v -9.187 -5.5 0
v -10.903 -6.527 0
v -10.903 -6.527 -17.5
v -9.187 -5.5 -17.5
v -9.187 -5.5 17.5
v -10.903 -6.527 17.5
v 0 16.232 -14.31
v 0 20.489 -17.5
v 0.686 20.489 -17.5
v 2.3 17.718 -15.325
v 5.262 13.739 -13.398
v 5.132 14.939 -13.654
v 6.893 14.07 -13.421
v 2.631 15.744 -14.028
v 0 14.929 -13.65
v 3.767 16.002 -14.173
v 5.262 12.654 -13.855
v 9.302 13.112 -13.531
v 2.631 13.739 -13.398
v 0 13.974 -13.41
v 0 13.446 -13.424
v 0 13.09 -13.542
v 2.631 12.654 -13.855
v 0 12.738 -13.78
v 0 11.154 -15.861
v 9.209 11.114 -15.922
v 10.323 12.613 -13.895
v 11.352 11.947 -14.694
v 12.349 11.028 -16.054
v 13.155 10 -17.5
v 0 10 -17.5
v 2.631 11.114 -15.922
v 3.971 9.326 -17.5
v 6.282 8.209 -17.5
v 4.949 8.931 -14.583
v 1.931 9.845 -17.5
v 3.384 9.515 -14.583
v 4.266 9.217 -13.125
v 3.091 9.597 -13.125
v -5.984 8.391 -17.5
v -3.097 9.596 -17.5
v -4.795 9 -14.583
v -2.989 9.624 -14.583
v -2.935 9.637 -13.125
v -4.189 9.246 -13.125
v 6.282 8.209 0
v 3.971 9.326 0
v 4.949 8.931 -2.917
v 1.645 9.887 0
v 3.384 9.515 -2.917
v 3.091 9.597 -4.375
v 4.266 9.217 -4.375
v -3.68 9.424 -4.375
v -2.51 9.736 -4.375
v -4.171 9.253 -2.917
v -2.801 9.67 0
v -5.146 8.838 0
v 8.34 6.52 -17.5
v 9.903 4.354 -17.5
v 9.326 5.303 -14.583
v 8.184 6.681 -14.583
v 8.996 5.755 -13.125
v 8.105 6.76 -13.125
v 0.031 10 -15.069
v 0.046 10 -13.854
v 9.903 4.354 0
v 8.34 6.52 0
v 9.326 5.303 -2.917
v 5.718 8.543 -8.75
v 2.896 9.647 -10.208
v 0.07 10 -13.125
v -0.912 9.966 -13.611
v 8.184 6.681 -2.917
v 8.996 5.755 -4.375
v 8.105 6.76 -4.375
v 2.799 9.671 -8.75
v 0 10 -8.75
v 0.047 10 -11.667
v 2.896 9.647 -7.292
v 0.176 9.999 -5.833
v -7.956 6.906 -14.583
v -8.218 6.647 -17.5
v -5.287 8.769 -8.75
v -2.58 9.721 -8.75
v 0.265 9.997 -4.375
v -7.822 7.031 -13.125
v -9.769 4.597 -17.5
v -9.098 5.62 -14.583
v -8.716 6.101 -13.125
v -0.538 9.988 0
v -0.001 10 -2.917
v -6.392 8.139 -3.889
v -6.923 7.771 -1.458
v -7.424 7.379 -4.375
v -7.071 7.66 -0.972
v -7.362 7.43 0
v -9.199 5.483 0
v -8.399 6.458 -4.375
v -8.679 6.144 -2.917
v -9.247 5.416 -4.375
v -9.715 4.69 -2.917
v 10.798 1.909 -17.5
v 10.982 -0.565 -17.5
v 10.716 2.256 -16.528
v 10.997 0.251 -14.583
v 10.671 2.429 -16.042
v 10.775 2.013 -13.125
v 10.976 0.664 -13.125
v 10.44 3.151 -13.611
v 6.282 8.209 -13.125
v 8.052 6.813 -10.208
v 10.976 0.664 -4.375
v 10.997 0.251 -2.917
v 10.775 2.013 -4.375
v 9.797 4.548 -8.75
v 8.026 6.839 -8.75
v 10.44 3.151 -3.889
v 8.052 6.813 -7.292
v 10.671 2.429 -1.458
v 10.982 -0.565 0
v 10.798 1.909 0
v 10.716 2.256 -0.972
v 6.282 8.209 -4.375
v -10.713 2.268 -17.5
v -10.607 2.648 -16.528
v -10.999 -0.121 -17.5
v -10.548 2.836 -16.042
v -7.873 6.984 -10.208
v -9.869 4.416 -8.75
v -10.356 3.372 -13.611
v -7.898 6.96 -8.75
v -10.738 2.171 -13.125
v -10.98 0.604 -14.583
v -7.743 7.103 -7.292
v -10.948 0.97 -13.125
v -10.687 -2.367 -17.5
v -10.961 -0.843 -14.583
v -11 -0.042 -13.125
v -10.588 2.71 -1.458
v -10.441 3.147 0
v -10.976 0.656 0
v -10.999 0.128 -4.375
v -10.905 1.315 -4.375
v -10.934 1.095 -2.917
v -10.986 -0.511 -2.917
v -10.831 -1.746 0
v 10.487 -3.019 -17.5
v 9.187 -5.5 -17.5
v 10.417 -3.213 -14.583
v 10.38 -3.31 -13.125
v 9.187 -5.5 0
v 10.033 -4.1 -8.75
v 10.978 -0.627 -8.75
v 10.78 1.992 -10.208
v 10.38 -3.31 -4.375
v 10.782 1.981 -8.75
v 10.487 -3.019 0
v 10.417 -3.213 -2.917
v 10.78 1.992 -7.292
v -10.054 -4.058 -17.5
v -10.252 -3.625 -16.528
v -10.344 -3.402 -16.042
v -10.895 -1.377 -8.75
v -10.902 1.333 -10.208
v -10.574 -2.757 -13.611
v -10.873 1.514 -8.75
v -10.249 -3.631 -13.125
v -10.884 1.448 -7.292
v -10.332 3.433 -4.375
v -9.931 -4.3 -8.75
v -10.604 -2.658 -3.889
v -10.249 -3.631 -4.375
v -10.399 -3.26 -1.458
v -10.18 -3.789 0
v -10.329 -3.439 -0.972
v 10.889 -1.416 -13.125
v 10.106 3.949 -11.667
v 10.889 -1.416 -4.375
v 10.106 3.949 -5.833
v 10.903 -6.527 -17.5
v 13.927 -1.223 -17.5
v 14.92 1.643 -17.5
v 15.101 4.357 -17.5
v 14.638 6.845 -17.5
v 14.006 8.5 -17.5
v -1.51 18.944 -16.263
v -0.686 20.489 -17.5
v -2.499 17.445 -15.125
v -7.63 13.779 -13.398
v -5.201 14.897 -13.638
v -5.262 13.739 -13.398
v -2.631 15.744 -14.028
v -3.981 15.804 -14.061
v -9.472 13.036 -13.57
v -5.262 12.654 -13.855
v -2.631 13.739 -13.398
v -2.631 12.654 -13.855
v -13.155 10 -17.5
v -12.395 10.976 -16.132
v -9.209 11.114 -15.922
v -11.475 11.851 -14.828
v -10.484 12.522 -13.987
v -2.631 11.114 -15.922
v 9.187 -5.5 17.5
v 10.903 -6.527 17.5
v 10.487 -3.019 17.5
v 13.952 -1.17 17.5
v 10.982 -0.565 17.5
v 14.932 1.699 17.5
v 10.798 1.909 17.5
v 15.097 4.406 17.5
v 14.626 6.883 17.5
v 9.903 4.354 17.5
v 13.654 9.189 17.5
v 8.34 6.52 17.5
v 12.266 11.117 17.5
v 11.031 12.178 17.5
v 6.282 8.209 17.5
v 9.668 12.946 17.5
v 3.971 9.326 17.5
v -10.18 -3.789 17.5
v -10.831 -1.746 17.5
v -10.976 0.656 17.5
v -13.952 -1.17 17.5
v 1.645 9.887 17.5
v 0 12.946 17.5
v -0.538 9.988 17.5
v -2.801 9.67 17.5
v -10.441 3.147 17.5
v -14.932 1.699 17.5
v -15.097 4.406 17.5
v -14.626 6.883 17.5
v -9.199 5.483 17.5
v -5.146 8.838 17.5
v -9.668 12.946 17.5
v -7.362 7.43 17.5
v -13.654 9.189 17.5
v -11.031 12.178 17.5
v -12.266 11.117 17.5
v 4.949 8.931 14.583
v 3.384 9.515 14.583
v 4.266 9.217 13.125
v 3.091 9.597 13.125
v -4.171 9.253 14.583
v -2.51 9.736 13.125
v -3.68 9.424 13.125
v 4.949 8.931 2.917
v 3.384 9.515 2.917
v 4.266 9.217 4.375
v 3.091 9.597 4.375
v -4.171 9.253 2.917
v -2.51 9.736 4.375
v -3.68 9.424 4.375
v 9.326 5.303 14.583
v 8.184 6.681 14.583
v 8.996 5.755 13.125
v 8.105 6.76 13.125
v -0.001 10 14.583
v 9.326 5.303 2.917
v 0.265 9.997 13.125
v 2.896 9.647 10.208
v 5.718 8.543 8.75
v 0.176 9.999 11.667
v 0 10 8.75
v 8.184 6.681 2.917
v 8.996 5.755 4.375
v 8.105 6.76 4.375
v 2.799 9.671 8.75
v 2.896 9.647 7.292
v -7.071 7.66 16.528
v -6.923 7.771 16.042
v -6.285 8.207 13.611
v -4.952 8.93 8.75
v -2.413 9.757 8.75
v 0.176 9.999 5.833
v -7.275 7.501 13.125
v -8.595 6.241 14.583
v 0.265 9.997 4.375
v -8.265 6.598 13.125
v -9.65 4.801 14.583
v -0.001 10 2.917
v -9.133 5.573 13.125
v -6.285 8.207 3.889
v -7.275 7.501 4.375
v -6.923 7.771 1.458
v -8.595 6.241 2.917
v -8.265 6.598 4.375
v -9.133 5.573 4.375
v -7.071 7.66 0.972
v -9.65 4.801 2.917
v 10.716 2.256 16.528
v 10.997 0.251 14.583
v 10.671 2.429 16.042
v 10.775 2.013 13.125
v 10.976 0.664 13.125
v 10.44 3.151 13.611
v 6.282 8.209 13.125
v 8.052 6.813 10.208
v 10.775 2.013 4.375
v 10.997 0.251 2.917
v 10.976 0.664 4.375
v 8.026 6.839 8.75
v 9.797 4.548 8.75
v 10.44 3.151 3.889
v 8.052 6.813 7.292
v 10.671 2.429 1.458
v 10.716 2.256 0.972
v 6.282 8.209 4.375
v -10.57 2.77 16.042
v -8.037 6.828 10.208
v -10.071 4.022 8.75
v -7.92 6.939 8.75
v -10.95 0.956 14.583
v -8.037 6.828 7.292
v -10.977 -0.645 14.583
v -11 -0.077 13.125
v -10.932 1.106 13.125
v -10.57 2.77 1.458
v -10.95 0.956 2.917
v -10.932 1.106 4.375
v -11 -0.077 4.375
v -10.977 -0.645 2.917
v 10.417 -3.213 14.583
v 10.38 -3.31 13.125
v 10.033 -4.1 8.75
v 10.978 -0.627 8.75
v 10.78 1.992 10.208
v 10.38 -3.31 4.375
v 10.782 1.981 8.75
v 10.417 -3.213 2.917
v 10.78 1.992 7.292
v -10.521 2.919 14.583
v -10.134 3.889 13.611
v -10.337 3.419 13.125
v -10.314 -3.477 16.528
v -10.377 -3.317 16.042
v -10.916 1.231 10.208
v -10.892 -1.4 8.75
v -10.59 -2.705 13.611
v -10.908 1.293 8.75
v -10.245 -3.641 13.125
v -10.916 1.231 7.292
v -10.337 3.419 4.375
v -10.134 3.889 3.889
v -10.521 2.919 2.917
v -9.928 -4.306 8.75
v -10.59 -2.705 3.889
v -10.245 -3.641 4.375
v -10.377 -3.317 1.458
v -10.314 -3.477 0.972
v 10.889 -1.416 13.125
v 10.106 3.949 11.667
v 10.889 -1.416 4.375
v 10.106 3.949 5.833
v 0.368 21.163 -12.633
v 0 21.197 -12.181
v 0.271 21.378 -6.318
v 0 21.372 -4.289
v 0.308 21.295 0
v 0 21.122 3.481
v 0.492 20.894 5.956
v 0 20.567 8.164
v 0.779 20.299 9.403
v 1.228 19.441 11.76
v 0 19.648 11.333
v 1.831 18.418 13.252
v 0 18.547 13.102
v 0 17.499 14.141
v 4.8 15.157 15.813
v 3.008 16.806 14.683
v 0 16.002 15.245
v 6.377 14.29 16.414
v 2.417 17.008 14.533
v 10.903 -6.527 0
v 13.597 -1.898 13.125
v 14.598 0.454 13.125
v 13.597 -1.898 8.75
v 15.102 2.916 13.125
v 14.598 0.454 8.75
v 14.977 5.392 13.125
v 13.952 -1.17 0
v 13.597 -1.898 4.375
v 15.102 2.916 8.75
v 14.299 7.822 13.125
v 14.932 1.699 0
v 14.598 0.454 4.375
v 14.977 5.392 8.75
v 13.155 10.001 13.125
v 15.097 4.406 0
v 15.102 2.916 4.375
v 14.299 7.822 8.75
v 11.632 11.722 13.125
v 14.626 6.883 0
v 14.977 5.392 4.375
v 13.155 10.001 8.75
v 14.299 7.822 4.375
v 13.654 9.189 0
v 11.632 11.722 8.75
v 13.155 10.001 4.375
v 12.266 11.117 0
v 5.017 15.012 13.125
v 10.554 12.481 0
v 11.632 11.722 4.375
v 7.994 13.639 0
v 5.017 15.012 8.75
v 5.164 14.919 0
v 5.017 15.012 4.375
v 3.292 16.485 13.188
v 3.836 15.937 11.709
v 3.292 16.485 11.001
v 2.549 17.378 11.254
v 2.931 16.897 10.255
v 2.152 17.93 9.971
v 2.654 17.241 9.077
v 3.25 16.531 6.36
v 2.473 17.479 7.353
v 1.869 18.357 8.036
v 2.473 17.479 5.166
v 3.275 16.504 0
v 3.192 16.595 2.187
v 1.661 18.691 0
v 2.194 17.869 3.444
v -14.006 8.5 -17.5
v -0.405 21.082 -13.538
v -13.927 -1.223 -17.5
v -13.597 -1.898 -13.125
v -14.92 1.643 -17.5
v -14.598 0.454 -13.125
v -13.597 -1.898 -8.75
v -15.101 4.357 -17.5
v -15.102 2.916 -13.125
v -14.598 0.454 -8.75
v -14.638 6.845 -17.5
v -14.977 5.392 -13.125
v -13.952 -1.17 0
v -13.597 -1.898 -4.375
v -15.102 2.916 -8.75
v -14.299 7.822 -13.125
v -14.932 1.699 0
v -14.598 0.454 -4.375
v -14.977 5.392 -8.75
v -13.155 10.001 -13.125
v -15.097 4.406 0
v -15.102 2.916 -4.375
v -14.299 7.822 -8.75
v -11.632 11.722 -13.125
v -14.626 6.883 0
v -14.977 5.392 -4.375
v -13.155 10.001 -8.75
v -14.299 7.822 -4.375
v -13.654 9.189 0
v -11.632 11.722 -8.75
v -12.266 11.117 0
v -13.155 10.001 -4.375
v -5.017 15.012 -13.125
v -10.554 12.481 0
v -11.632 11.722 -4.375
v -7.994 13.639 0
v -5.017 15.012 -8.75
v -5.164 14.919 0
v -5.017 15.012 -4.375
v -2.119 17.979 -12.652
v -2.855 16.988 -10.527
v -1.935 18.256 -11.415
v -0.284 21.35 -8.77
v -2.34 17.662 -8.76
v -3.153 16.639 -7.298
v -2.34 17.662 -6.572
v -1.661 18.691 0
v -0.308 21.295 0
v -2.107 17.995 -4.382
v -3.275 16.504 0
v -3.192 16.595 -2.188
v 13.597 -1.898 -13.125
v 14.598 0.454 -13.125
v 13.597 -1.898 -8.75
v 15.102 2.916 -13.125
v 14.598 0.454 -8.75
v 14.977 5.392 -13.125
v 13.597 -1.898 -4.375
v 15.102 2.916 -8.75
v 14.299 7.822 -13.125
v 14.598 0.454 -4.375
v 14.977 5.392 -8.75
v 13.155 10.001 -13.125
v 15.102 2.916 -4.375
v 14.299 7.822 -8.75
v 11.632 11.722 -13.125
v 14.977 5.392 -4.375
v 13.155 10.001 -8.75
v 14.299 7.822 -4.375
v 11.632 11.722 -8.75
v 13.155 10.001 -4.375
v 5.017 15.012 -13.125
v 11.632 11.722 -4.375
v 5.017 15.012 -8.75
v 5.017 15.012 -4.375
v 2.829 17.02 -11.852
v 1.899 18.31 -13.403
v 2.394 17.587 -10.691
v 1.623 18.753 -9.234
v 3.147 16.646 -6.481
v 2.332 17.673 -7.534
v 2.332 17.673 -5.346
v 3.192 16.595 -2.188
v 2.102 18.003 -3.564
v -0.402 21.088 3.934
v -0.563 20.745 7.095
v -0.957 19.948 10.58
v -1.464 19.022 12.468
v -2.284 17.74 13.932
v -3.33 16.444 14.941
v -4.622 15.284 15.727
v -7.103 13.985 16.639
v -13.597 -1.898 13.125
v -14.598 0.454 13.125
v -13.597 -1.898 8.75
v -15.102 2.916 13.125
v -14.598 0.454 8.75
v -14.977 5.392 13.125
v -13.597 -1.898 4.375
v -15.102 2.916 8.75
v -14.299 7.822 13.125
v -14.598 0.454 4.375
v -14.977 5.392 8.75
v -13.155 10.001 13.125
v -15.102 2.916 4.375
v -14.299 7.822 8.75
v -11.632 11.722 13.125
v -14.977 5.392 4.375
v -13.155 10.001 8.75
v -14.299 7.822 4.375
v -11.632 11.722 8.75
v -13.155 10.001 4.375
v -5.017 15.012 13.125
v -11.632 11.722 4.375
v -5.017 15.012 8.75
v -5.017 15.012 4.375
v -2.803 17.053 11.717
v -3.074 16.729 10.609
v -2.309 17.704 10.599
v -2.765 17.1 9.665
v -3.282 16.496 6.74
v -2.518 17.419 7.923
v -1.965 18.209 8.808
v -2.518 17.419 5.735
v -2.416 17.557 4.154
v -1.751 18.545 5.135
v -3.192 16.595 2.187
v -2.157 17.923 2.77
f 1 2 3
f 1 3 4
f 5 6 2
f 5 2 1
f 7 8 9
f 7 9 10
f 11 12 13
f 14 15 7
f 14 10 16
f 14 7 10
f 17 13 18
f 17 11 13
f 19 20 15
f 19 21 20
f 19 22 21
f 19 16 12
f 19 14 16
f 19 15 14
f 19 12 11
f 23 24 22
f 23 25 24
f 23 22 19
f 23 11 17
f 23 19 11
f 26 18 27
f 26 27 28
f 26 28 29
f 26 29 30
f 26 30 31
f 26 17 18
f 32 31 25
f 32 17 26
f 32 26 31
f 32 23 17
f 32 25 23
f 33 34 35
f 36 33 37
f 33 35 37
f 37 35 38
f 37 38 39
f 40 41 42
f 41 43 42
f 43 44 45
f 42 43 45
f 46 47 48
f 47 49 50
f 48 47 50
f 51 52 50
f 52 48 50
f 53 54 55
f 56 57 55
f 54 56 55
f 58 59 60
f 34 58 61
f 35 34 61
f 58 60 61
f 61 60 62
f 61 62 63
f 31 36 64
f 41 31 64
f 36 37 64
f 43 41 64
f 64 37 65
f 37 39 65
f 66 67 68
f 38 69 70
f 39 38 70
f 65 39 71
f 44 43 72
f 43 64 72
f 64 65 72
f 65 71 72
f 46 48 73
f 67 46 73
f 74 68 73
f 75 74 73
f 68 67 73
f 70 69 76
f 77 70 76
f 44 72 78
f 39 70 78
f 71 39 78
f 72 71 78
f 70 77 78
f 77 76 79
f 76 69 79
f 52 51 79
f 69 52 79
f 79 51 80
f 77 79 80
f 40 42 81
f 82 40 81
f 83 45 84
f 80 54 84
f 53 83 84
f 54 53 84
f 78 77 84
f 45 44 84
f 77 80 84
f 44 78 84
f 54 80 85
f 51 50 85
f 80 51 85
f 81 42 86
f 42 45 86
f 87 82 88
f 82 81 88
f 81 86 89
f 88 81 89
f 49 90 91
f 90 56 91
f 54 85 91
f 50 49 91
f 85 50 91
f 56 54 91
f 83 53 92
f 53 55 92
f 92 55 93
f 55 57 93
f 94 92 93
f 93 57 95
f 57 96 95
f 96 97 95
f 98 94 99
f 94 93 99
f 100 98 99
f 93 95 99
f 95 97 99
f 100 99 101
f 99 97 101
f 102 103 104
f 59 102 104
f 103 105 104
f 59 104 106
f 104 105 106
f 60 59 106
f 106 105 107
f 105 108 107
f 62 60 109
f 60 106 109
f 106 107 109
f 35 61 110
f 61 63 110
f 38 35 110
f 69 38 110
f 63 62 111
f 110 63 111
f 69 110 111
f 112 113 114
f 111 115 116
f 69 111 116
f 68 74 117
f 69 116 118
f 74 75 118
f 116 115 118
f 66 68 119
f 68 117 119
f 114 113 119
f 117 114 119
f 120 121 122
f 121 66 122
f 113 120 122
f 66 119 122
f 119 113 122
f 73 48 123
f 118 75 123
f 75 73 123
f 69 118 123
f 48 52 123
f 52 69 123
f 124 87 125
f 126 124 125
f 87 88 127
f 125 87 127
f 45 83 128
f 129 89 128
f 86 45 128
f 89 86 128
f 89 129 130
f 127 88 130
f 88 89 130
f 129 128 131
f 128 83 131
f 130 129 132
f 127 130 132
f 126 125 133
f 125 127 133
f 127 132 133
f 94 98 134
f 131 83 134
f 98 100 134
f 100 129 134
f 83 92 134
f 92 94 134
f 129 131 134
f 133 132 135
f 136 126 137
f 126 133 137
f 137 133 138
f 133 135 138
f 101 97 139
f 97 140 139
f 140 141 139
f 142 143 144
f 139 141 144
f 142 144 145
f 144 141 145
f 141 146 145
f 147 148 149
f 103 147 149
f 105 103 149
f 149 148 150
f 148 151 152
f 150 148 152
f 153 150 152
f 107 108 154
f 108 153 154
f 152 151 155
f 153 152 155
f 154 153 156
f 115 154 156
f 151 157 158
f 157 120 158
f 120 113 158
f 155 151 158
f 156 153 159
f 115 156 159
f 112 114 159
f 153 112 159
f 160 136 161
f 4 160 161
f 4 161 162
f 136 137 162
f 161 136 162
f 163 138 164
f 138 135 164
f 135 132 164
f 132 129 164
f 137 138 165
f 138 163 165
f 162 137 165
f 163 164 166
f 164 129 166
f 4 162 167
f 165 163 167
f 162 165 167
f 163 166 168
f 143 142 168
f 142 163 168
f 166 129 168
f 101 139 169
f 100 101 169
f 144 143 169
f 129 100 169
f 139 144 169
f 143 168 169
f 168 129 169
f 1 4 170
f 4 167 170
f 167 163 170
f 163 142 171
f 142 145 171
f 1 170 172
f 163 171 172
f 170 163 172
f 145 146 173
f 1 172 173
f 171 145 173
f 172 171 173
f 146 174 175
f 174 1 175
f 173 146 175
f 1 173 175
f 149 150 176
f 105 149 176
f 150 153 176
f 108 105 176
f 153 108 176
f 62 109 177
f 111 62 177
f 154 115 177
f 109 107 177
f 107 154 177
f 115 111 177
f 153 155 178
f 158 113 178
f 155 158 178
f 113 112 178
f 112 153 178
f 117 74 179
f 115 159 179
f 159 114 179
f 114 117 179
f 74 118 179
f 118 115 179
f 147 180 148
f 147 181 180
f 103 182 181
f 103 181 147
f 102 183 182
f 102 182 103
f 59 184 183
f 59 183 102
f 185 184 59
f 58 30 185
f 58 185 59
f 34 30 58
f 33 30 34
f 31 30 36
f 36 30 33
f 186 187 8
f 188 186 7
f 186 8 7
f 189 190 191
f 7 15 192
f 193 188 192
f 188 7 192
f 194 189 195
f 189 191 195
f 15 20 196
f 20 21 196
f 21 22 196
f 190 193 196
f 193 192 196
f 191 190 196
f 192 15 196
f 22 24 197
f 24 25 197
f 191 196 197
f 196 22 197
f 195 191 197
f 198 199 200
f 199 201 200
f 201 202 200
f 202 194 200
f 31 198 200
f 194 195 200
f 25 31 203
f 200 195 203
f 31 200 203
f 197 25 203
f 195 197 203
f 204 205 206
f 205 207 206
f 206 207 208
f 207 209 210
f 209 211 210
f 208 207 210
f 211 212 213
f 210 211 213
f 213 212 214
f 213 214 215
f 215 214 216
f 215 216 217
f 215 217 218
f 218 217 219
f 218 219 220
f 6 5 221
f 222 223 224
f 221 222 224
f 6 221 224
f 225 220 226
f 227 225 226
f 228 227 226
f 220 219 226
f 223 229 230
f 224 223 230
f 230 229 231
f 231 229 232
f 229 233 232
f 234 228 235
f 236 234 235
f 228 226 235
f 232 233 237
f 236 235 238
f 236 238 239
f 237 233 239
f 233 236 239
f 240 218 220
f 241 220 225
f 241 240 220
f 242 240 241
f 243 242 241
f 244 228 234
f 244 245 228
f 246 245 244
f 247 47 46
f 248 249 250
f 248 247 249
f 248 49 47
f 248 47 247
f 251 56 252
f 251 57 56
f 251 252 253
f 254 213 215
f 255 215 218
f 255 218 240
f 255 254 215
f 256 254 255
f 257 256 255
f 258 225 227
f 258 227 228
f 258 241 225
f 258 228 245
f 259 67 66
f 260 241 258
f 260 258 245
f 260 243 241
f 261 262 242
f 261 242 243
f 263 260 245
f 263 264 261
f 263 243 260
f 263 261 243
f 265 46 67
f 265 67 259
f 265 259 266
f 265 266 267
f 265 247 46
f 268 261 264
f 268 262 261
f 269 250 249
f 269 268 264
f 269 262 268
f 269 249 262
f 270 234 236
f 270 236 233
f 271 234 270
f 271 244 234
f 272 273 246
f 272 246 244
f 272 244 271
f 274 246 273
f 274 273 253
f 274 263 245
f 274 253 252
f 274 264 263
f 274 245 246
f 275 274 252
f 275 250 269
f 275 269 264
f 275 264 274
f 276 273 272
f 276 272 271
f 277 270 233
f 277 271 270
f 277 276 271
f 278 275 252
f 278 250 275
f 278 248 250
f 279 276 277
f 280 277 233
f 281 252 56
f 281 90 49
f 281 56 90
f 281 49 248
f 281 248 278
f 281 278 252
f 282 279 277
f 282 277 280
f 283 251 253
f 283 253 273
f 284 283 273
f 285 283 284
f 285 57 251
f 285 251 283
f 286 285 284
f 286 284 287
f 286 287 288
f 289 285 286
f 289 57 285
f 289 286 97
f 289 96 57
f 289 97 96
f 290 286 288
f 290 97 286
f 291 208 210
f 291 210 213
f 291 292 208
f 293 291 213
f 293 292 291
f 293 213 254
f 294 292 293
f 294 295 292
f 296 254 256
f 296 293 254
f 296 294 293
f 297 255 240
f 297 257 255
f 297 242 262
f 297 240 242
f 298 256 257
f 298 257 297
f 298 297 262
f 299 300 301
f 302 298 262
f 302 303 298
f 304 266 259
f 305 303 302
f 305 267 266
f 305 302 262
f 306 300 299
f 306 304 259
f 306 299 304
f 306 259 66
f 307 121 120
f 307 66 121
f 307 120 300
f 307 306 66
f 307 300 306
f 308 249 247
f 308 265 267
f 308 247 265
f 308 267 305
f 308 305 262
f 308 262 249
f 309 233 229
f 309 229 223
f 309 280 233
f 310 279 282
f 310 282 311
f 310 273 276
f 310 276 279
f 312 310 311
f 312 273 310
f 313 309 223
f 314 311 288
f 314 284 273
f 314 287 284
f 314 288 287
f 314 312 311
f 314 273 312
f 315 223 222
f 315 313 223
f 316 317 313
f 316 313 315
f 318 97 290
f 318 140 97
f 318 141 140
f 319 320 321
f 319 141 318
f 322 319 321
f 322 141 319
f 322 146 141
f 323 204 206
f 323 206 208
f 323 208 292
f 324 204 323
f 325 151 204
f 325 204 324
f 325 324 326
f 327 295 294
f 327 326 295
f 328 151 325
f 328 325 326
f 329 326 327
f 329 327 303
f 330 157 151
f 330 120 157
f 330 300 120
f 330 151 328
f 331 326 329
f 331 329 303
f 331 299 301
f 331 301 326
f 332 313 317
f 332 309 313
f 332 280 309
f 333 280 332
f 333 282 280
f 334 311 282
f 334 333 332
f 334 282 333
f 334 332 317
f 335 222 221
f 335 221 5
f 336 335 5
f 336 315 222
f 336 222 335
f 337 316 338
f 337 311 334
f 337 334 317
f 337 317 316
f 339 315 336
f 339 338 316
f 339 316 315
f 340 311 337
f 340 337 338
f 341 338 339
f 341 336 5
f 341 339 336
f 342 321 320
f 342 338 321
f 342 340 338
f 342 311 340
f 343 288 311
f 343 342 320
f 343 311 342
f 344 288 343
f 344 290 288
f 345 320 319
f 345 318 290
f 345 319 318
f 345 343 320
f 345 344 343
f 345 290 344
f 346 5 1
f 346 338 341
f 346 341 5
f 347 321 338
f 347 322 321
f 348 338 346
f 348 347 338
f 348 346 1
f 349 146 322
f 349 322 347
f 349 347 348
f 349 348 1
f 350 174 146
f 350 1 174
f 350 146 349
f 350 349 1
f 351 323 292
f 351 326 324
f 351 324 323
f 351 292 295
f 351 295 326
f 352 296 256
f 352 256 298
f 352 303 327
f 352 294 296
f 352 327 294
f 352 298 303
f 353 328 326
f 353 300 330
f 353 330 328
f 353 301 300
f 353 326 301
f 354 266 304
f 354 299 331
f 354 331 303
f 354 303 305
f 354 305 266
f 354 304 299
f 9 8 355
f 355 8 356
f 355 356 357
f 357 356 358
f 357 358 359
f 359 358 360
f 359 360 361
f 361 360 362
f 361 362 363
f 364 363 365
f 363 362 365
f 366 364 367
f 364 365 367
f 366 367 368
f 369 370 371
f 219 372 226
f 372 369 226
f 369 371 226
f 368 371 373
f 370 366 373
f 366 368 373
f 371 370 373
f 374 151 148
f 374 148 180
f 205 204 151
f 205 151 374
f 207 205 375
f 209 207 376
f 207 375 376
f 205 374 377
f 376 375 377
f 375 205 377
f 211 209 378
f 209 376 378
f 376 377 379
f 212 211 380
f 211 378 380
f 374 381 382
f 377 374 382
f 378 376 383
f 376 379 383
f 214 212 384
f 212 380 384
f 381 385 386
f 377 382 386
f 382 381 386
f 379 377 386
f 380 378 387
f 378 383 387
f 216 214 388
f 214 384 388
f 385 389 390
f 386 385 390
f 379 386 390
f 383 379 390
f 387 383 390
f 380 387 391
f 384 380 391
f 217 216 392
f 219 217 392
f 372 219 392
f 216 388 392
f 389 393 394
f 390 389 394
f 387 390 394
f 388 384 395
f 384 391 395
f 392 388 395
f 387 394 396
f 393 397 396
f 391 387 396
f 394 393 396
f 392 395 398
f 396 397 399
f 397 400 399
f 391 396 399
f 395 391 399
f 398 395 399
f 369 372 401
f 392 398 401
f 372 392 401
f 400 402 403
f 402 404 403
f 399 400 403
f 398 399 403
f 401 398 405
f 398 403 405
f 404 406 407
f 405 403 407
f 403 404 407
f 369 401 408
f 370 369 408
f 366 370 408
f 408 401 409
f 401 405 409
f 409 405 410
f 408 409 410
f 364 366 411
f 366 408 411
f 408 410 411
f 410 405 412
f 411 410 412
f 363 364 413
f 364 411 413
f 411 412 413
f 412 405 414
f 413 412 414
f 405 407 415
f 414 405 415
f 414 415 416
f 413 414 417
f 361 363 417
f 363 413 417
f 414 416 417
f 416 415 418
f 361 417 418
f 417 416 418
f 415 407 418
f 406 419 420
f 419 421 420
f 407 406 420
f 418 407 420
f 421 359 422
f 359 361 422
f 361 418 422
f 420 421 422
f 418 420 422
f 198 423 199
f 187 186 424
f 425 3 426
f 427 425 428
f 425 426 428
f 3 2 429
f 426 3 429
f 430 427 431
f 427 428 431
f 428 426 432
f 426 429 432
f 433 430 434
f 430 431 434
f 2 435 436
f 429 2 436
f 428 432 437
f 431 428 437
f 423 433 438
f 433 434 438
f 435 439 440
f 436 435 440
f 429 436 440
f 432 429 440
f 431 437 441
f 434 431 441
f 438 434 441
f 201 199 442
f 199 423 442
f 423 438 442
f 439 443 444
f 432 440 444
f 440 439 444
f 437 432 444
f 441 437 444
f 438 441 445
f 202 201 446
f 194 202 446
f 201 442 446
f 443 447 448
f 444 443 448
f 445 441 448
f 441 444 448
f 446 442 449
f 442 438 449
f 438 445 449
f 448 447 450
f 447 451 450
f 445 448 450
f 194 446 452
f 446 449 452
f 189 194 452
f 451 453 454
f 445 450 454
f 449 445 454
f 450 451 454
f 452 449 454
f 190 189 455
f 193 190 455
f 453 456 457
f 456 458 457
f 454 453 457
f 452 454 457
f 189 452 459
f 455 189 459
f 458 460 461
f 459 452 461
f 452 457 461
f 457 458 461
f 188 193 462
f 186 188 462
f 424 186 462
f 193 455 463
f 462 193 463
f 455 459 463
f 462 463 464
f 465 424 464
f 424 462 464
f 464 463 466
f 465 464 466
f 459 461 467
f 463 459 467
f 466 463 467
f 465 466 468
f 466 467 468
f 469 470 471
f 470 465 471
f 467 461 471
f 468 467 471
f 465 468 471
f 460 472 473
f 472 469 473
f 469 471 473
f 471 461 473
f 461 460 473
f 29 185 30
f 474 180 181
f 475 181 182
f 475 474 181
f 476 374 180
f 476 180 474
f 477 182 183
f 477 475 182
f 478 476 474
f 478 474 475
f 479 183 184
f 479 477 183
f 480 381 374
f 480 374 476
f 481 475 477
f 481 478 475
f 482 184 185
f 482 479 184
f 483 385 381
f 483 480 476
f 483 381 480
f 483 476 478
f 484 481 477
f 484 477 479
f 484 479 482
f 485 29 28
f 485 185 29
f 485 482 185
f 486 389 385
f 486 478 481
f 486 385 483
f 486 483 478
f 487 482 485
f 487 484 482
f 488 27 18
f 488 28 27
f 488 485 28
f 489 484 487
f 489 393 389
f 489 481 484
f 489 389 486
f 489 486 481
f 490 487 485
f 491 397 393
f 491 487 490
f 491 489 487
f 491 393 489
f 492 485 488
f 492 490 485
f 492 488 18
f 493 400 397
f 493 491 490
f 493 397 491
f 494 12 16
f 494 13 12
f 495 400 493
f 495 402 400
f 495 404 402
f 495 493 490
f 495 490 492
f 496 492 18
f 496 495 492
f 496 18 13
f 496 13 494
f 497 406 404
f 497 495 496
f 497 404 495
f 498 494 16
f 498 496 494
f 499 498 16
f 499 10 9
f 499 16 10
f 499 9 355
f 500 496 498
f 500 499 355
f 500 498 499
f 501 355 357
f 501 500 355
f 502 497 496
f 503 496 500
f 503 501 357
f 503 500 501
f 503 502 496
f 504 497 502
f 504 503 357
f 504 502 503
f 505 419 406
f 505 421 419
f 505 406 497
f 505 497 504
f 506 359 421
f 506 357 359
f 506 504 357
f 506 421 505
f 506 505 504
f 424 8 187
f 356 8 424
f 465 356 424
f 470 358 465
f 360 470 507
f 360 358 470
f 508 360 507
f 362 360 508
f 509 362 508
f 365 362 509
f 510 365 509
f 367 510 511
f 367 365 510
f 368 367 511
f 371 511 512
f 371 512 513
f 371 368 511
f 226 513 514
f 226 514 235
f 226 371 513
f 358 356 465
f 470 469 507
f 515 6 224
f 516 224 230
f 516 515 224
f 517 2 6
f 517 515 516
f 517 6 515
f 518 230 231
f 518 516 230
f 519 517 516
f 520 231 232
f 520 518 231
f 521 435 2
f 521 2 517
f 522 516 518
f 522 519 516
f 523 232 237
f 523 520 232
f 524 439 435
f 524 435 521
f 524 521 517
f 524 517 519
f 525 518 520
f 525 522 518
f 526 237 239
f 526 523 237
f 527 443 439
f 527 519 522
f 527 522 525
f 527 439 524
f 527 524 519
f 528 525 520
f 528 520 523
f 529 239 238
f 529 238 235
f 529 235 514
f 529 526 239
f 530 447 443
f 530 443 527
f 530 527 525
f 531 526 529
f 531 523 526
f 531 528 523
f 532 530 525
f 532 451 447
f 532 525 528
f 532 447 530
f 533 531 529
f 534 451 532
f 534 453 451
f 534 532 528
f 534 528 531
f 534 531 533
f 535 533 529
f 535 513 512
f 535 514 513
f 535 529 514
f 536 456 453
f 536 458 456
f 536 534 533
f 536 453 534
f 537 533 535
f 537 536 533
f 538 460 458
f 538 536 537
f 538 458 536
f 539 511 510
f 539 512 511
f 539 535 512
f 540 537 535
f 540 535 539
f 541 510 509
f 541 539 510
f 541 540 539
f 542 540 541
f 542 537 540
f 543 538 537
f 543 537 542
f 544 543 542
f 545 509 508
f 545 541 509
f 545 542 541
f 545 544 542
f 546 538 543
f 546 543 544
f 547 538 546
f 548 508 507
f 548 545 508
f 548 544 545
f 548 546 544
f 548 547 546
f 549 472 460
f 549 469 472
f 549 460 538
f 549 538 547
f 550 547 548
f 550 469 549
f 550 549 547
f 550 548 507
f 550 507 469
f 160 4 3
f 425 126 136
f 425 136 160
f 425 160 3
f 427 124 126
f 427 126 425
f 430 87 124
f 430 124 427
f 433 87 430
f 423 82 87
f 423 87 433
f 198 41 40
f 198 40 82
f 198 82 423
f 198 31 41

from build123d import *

# Parameters (mm, degrees)
F1_DEPTH      = 17.5
F3_DEPTH      = 15.1287347934
F3_DEPTH_BACK = 15.1287347934
F5_DEPTH      = 15.1287347934
F5_DEPTH_BACK = 15.1287347934


with BuildPart() as f1:
    # F0 (on Top) → F1 (new body, symmetric)
    with BuildSketch(Plane.XY):
        with BuildLine():
            add(Edge.make_bspline(
                [(9.1868111987, -5.5), (20.415135997, 10), (0, 10), (-20.415135997, 10), (-9.1868111987, -5.5)],
                knots=[2.5592284157, 2.5592284157, 2.5592284157, 4.7123889804, 4.7123889804, 6.865549545, 6.865549545, 6.865549545], degree=2, weights=[1, 0.474341649, 1, 0.474341649, 1]))
            Line((9.1868111987, -5.5), (10.9027922676, -6.5273309939))
            add(Edge.make_bspline(
                [(10.9027922676, -6.5273309939), (12.7389340253, -3.3890525439), (16.8731179435, 2.3245435176), (12.5821699396, 13.0625810745), (4.2594516513, 14.0193672421), (1.2600043773, 19.0299124435), (0, 22)],
                knots=[0, 0, 0, 0, 0.2691946522, 0.5268109314, 0.7543956387, 1, 1, 1, 1], degree=3))
            add(Edge.make_bspline(
                [(-10.9027922676, -6.5273309939), (-12.7389340253, -3.3890525439), (-16.8731179435, 2.3245435176), (-12.5821699396, 13.0625810745), (-4.2594516513, 14.0193672421), (-1.2600043773, 19.0299124435), (0, 22)],
                knots=[0, 0, 0, 0, 0.2691946522, 0.5268109314, 0.7543956387, 1, 1, 1, 1], degree=3))
            Line((-10.9027922676, -6.5273309939), (-9.1868111987, -5.5))
        make_face()
    extrude(amount=F1_DEPTH, both=True)

    # F2 (on Right) → F3 (cut, two sides)
    with BuildSketch(Plane.YZ) as f3_sk:
        with BuildLine():
            Line((22, -17.5), (22, 17.5))
            add(Edge.make_bspline(
                [(12.9458382726, 17.5), (12.9847525399, 17.5), (13.3425955297, 17.5), (15.3706202534, 17.5), (18.3497598952, 17.5), (21.0099708145, 17.5), (22, 17.5)],
                knots=[19.4731692664, 19.4731692664, 19.4731692664, 19.4731692664, 19.5899120684, 20.546698236, 25.5572434374, 28.5273309939, 28.5273309939, 28.5273309939, 28.5273309939], degree=3))
            add(Edge.make_bspline(
                [(20.4889792066, -17.5), (21.3069921459, -13.572259105), (21.5040260738, -4.998294653), (21.0682047604, 10.0934973141), (17.8072525963, 14.338356594), (14.1858932816, 16.3451904901), (12.9458382726, 17.5)],
                knots=[0, 0, 0, 0, 0.2890890669, 0.5956944703, 0.784981897, 0.9342249031, 0.9342249031, 0.9342249031, 0.9342249031], degree=3))
            add(Edge.make_bspline(
                [(20.4889792066, -17.5), (20.9926528044, -17.5), (21.4963264022, -17.5), (22, -17.5)],
                knots=[27.0163102004, 27.0163102004, 27.0163102004, 27.0163102004, 28.5273309939, 28.5273309939, 28.5273309939, 28.5273309939], degree=3))
        make_face()
    extrude(amount=F3_DEPTH, mode=Mode.SUBTRACT)
    extrude(f3_sk.sketch, amount=-F3_DEPTH_BACK, mode=Mode.SUBTRACT)

    # F4 (on Right) → F5 (cut, two sides)
    with BuildSketch(Plane.YZ) as f5_sk:
        with BuildLine():
            add(Edge.make_bspline(
                [(20.4889792065, -17.5), (20.0026236189, -17.5), (17.8460862974, -17.5), (15.3706202534, -17.5), (12.3606494389, -17.5), (11.0208603582, -17.5), (10, -17.5)],
                knots=[1.5110207935, 1.5110207935, 1.5110207935, 1.5110207935, 2.9700875565, 7.9806327579, 8.9374189255, 12, 12, 12, 12], degree=3))
            add(Edge.make_bspline(
                [(20.4889792065, -17.5), (18.7860671315, -16.1256874953), (16.0650931023, -13.9297616527), (13.7700201304, -13.2466113293), (12.5050464748, -13.6972839369), (10.901211893, -16.3099588504), (10.2649782675, -17.1500988896), (10, -17.5)],
                knots=[0, 0, 0, 0, 0.3061167398, 0.4891243131, 0.6260717542, 0.844266548, 1, 1, 1, 1], degree=3))
        make_face()
    extrude(amount=-F5_DEPTH, mode=Mode.SUBTRACT)
    extrude(f5_sk.sketch, amount=F5_DEPTH_BACK, mode=Mode.SUBTRACT)


solid = f1.part
